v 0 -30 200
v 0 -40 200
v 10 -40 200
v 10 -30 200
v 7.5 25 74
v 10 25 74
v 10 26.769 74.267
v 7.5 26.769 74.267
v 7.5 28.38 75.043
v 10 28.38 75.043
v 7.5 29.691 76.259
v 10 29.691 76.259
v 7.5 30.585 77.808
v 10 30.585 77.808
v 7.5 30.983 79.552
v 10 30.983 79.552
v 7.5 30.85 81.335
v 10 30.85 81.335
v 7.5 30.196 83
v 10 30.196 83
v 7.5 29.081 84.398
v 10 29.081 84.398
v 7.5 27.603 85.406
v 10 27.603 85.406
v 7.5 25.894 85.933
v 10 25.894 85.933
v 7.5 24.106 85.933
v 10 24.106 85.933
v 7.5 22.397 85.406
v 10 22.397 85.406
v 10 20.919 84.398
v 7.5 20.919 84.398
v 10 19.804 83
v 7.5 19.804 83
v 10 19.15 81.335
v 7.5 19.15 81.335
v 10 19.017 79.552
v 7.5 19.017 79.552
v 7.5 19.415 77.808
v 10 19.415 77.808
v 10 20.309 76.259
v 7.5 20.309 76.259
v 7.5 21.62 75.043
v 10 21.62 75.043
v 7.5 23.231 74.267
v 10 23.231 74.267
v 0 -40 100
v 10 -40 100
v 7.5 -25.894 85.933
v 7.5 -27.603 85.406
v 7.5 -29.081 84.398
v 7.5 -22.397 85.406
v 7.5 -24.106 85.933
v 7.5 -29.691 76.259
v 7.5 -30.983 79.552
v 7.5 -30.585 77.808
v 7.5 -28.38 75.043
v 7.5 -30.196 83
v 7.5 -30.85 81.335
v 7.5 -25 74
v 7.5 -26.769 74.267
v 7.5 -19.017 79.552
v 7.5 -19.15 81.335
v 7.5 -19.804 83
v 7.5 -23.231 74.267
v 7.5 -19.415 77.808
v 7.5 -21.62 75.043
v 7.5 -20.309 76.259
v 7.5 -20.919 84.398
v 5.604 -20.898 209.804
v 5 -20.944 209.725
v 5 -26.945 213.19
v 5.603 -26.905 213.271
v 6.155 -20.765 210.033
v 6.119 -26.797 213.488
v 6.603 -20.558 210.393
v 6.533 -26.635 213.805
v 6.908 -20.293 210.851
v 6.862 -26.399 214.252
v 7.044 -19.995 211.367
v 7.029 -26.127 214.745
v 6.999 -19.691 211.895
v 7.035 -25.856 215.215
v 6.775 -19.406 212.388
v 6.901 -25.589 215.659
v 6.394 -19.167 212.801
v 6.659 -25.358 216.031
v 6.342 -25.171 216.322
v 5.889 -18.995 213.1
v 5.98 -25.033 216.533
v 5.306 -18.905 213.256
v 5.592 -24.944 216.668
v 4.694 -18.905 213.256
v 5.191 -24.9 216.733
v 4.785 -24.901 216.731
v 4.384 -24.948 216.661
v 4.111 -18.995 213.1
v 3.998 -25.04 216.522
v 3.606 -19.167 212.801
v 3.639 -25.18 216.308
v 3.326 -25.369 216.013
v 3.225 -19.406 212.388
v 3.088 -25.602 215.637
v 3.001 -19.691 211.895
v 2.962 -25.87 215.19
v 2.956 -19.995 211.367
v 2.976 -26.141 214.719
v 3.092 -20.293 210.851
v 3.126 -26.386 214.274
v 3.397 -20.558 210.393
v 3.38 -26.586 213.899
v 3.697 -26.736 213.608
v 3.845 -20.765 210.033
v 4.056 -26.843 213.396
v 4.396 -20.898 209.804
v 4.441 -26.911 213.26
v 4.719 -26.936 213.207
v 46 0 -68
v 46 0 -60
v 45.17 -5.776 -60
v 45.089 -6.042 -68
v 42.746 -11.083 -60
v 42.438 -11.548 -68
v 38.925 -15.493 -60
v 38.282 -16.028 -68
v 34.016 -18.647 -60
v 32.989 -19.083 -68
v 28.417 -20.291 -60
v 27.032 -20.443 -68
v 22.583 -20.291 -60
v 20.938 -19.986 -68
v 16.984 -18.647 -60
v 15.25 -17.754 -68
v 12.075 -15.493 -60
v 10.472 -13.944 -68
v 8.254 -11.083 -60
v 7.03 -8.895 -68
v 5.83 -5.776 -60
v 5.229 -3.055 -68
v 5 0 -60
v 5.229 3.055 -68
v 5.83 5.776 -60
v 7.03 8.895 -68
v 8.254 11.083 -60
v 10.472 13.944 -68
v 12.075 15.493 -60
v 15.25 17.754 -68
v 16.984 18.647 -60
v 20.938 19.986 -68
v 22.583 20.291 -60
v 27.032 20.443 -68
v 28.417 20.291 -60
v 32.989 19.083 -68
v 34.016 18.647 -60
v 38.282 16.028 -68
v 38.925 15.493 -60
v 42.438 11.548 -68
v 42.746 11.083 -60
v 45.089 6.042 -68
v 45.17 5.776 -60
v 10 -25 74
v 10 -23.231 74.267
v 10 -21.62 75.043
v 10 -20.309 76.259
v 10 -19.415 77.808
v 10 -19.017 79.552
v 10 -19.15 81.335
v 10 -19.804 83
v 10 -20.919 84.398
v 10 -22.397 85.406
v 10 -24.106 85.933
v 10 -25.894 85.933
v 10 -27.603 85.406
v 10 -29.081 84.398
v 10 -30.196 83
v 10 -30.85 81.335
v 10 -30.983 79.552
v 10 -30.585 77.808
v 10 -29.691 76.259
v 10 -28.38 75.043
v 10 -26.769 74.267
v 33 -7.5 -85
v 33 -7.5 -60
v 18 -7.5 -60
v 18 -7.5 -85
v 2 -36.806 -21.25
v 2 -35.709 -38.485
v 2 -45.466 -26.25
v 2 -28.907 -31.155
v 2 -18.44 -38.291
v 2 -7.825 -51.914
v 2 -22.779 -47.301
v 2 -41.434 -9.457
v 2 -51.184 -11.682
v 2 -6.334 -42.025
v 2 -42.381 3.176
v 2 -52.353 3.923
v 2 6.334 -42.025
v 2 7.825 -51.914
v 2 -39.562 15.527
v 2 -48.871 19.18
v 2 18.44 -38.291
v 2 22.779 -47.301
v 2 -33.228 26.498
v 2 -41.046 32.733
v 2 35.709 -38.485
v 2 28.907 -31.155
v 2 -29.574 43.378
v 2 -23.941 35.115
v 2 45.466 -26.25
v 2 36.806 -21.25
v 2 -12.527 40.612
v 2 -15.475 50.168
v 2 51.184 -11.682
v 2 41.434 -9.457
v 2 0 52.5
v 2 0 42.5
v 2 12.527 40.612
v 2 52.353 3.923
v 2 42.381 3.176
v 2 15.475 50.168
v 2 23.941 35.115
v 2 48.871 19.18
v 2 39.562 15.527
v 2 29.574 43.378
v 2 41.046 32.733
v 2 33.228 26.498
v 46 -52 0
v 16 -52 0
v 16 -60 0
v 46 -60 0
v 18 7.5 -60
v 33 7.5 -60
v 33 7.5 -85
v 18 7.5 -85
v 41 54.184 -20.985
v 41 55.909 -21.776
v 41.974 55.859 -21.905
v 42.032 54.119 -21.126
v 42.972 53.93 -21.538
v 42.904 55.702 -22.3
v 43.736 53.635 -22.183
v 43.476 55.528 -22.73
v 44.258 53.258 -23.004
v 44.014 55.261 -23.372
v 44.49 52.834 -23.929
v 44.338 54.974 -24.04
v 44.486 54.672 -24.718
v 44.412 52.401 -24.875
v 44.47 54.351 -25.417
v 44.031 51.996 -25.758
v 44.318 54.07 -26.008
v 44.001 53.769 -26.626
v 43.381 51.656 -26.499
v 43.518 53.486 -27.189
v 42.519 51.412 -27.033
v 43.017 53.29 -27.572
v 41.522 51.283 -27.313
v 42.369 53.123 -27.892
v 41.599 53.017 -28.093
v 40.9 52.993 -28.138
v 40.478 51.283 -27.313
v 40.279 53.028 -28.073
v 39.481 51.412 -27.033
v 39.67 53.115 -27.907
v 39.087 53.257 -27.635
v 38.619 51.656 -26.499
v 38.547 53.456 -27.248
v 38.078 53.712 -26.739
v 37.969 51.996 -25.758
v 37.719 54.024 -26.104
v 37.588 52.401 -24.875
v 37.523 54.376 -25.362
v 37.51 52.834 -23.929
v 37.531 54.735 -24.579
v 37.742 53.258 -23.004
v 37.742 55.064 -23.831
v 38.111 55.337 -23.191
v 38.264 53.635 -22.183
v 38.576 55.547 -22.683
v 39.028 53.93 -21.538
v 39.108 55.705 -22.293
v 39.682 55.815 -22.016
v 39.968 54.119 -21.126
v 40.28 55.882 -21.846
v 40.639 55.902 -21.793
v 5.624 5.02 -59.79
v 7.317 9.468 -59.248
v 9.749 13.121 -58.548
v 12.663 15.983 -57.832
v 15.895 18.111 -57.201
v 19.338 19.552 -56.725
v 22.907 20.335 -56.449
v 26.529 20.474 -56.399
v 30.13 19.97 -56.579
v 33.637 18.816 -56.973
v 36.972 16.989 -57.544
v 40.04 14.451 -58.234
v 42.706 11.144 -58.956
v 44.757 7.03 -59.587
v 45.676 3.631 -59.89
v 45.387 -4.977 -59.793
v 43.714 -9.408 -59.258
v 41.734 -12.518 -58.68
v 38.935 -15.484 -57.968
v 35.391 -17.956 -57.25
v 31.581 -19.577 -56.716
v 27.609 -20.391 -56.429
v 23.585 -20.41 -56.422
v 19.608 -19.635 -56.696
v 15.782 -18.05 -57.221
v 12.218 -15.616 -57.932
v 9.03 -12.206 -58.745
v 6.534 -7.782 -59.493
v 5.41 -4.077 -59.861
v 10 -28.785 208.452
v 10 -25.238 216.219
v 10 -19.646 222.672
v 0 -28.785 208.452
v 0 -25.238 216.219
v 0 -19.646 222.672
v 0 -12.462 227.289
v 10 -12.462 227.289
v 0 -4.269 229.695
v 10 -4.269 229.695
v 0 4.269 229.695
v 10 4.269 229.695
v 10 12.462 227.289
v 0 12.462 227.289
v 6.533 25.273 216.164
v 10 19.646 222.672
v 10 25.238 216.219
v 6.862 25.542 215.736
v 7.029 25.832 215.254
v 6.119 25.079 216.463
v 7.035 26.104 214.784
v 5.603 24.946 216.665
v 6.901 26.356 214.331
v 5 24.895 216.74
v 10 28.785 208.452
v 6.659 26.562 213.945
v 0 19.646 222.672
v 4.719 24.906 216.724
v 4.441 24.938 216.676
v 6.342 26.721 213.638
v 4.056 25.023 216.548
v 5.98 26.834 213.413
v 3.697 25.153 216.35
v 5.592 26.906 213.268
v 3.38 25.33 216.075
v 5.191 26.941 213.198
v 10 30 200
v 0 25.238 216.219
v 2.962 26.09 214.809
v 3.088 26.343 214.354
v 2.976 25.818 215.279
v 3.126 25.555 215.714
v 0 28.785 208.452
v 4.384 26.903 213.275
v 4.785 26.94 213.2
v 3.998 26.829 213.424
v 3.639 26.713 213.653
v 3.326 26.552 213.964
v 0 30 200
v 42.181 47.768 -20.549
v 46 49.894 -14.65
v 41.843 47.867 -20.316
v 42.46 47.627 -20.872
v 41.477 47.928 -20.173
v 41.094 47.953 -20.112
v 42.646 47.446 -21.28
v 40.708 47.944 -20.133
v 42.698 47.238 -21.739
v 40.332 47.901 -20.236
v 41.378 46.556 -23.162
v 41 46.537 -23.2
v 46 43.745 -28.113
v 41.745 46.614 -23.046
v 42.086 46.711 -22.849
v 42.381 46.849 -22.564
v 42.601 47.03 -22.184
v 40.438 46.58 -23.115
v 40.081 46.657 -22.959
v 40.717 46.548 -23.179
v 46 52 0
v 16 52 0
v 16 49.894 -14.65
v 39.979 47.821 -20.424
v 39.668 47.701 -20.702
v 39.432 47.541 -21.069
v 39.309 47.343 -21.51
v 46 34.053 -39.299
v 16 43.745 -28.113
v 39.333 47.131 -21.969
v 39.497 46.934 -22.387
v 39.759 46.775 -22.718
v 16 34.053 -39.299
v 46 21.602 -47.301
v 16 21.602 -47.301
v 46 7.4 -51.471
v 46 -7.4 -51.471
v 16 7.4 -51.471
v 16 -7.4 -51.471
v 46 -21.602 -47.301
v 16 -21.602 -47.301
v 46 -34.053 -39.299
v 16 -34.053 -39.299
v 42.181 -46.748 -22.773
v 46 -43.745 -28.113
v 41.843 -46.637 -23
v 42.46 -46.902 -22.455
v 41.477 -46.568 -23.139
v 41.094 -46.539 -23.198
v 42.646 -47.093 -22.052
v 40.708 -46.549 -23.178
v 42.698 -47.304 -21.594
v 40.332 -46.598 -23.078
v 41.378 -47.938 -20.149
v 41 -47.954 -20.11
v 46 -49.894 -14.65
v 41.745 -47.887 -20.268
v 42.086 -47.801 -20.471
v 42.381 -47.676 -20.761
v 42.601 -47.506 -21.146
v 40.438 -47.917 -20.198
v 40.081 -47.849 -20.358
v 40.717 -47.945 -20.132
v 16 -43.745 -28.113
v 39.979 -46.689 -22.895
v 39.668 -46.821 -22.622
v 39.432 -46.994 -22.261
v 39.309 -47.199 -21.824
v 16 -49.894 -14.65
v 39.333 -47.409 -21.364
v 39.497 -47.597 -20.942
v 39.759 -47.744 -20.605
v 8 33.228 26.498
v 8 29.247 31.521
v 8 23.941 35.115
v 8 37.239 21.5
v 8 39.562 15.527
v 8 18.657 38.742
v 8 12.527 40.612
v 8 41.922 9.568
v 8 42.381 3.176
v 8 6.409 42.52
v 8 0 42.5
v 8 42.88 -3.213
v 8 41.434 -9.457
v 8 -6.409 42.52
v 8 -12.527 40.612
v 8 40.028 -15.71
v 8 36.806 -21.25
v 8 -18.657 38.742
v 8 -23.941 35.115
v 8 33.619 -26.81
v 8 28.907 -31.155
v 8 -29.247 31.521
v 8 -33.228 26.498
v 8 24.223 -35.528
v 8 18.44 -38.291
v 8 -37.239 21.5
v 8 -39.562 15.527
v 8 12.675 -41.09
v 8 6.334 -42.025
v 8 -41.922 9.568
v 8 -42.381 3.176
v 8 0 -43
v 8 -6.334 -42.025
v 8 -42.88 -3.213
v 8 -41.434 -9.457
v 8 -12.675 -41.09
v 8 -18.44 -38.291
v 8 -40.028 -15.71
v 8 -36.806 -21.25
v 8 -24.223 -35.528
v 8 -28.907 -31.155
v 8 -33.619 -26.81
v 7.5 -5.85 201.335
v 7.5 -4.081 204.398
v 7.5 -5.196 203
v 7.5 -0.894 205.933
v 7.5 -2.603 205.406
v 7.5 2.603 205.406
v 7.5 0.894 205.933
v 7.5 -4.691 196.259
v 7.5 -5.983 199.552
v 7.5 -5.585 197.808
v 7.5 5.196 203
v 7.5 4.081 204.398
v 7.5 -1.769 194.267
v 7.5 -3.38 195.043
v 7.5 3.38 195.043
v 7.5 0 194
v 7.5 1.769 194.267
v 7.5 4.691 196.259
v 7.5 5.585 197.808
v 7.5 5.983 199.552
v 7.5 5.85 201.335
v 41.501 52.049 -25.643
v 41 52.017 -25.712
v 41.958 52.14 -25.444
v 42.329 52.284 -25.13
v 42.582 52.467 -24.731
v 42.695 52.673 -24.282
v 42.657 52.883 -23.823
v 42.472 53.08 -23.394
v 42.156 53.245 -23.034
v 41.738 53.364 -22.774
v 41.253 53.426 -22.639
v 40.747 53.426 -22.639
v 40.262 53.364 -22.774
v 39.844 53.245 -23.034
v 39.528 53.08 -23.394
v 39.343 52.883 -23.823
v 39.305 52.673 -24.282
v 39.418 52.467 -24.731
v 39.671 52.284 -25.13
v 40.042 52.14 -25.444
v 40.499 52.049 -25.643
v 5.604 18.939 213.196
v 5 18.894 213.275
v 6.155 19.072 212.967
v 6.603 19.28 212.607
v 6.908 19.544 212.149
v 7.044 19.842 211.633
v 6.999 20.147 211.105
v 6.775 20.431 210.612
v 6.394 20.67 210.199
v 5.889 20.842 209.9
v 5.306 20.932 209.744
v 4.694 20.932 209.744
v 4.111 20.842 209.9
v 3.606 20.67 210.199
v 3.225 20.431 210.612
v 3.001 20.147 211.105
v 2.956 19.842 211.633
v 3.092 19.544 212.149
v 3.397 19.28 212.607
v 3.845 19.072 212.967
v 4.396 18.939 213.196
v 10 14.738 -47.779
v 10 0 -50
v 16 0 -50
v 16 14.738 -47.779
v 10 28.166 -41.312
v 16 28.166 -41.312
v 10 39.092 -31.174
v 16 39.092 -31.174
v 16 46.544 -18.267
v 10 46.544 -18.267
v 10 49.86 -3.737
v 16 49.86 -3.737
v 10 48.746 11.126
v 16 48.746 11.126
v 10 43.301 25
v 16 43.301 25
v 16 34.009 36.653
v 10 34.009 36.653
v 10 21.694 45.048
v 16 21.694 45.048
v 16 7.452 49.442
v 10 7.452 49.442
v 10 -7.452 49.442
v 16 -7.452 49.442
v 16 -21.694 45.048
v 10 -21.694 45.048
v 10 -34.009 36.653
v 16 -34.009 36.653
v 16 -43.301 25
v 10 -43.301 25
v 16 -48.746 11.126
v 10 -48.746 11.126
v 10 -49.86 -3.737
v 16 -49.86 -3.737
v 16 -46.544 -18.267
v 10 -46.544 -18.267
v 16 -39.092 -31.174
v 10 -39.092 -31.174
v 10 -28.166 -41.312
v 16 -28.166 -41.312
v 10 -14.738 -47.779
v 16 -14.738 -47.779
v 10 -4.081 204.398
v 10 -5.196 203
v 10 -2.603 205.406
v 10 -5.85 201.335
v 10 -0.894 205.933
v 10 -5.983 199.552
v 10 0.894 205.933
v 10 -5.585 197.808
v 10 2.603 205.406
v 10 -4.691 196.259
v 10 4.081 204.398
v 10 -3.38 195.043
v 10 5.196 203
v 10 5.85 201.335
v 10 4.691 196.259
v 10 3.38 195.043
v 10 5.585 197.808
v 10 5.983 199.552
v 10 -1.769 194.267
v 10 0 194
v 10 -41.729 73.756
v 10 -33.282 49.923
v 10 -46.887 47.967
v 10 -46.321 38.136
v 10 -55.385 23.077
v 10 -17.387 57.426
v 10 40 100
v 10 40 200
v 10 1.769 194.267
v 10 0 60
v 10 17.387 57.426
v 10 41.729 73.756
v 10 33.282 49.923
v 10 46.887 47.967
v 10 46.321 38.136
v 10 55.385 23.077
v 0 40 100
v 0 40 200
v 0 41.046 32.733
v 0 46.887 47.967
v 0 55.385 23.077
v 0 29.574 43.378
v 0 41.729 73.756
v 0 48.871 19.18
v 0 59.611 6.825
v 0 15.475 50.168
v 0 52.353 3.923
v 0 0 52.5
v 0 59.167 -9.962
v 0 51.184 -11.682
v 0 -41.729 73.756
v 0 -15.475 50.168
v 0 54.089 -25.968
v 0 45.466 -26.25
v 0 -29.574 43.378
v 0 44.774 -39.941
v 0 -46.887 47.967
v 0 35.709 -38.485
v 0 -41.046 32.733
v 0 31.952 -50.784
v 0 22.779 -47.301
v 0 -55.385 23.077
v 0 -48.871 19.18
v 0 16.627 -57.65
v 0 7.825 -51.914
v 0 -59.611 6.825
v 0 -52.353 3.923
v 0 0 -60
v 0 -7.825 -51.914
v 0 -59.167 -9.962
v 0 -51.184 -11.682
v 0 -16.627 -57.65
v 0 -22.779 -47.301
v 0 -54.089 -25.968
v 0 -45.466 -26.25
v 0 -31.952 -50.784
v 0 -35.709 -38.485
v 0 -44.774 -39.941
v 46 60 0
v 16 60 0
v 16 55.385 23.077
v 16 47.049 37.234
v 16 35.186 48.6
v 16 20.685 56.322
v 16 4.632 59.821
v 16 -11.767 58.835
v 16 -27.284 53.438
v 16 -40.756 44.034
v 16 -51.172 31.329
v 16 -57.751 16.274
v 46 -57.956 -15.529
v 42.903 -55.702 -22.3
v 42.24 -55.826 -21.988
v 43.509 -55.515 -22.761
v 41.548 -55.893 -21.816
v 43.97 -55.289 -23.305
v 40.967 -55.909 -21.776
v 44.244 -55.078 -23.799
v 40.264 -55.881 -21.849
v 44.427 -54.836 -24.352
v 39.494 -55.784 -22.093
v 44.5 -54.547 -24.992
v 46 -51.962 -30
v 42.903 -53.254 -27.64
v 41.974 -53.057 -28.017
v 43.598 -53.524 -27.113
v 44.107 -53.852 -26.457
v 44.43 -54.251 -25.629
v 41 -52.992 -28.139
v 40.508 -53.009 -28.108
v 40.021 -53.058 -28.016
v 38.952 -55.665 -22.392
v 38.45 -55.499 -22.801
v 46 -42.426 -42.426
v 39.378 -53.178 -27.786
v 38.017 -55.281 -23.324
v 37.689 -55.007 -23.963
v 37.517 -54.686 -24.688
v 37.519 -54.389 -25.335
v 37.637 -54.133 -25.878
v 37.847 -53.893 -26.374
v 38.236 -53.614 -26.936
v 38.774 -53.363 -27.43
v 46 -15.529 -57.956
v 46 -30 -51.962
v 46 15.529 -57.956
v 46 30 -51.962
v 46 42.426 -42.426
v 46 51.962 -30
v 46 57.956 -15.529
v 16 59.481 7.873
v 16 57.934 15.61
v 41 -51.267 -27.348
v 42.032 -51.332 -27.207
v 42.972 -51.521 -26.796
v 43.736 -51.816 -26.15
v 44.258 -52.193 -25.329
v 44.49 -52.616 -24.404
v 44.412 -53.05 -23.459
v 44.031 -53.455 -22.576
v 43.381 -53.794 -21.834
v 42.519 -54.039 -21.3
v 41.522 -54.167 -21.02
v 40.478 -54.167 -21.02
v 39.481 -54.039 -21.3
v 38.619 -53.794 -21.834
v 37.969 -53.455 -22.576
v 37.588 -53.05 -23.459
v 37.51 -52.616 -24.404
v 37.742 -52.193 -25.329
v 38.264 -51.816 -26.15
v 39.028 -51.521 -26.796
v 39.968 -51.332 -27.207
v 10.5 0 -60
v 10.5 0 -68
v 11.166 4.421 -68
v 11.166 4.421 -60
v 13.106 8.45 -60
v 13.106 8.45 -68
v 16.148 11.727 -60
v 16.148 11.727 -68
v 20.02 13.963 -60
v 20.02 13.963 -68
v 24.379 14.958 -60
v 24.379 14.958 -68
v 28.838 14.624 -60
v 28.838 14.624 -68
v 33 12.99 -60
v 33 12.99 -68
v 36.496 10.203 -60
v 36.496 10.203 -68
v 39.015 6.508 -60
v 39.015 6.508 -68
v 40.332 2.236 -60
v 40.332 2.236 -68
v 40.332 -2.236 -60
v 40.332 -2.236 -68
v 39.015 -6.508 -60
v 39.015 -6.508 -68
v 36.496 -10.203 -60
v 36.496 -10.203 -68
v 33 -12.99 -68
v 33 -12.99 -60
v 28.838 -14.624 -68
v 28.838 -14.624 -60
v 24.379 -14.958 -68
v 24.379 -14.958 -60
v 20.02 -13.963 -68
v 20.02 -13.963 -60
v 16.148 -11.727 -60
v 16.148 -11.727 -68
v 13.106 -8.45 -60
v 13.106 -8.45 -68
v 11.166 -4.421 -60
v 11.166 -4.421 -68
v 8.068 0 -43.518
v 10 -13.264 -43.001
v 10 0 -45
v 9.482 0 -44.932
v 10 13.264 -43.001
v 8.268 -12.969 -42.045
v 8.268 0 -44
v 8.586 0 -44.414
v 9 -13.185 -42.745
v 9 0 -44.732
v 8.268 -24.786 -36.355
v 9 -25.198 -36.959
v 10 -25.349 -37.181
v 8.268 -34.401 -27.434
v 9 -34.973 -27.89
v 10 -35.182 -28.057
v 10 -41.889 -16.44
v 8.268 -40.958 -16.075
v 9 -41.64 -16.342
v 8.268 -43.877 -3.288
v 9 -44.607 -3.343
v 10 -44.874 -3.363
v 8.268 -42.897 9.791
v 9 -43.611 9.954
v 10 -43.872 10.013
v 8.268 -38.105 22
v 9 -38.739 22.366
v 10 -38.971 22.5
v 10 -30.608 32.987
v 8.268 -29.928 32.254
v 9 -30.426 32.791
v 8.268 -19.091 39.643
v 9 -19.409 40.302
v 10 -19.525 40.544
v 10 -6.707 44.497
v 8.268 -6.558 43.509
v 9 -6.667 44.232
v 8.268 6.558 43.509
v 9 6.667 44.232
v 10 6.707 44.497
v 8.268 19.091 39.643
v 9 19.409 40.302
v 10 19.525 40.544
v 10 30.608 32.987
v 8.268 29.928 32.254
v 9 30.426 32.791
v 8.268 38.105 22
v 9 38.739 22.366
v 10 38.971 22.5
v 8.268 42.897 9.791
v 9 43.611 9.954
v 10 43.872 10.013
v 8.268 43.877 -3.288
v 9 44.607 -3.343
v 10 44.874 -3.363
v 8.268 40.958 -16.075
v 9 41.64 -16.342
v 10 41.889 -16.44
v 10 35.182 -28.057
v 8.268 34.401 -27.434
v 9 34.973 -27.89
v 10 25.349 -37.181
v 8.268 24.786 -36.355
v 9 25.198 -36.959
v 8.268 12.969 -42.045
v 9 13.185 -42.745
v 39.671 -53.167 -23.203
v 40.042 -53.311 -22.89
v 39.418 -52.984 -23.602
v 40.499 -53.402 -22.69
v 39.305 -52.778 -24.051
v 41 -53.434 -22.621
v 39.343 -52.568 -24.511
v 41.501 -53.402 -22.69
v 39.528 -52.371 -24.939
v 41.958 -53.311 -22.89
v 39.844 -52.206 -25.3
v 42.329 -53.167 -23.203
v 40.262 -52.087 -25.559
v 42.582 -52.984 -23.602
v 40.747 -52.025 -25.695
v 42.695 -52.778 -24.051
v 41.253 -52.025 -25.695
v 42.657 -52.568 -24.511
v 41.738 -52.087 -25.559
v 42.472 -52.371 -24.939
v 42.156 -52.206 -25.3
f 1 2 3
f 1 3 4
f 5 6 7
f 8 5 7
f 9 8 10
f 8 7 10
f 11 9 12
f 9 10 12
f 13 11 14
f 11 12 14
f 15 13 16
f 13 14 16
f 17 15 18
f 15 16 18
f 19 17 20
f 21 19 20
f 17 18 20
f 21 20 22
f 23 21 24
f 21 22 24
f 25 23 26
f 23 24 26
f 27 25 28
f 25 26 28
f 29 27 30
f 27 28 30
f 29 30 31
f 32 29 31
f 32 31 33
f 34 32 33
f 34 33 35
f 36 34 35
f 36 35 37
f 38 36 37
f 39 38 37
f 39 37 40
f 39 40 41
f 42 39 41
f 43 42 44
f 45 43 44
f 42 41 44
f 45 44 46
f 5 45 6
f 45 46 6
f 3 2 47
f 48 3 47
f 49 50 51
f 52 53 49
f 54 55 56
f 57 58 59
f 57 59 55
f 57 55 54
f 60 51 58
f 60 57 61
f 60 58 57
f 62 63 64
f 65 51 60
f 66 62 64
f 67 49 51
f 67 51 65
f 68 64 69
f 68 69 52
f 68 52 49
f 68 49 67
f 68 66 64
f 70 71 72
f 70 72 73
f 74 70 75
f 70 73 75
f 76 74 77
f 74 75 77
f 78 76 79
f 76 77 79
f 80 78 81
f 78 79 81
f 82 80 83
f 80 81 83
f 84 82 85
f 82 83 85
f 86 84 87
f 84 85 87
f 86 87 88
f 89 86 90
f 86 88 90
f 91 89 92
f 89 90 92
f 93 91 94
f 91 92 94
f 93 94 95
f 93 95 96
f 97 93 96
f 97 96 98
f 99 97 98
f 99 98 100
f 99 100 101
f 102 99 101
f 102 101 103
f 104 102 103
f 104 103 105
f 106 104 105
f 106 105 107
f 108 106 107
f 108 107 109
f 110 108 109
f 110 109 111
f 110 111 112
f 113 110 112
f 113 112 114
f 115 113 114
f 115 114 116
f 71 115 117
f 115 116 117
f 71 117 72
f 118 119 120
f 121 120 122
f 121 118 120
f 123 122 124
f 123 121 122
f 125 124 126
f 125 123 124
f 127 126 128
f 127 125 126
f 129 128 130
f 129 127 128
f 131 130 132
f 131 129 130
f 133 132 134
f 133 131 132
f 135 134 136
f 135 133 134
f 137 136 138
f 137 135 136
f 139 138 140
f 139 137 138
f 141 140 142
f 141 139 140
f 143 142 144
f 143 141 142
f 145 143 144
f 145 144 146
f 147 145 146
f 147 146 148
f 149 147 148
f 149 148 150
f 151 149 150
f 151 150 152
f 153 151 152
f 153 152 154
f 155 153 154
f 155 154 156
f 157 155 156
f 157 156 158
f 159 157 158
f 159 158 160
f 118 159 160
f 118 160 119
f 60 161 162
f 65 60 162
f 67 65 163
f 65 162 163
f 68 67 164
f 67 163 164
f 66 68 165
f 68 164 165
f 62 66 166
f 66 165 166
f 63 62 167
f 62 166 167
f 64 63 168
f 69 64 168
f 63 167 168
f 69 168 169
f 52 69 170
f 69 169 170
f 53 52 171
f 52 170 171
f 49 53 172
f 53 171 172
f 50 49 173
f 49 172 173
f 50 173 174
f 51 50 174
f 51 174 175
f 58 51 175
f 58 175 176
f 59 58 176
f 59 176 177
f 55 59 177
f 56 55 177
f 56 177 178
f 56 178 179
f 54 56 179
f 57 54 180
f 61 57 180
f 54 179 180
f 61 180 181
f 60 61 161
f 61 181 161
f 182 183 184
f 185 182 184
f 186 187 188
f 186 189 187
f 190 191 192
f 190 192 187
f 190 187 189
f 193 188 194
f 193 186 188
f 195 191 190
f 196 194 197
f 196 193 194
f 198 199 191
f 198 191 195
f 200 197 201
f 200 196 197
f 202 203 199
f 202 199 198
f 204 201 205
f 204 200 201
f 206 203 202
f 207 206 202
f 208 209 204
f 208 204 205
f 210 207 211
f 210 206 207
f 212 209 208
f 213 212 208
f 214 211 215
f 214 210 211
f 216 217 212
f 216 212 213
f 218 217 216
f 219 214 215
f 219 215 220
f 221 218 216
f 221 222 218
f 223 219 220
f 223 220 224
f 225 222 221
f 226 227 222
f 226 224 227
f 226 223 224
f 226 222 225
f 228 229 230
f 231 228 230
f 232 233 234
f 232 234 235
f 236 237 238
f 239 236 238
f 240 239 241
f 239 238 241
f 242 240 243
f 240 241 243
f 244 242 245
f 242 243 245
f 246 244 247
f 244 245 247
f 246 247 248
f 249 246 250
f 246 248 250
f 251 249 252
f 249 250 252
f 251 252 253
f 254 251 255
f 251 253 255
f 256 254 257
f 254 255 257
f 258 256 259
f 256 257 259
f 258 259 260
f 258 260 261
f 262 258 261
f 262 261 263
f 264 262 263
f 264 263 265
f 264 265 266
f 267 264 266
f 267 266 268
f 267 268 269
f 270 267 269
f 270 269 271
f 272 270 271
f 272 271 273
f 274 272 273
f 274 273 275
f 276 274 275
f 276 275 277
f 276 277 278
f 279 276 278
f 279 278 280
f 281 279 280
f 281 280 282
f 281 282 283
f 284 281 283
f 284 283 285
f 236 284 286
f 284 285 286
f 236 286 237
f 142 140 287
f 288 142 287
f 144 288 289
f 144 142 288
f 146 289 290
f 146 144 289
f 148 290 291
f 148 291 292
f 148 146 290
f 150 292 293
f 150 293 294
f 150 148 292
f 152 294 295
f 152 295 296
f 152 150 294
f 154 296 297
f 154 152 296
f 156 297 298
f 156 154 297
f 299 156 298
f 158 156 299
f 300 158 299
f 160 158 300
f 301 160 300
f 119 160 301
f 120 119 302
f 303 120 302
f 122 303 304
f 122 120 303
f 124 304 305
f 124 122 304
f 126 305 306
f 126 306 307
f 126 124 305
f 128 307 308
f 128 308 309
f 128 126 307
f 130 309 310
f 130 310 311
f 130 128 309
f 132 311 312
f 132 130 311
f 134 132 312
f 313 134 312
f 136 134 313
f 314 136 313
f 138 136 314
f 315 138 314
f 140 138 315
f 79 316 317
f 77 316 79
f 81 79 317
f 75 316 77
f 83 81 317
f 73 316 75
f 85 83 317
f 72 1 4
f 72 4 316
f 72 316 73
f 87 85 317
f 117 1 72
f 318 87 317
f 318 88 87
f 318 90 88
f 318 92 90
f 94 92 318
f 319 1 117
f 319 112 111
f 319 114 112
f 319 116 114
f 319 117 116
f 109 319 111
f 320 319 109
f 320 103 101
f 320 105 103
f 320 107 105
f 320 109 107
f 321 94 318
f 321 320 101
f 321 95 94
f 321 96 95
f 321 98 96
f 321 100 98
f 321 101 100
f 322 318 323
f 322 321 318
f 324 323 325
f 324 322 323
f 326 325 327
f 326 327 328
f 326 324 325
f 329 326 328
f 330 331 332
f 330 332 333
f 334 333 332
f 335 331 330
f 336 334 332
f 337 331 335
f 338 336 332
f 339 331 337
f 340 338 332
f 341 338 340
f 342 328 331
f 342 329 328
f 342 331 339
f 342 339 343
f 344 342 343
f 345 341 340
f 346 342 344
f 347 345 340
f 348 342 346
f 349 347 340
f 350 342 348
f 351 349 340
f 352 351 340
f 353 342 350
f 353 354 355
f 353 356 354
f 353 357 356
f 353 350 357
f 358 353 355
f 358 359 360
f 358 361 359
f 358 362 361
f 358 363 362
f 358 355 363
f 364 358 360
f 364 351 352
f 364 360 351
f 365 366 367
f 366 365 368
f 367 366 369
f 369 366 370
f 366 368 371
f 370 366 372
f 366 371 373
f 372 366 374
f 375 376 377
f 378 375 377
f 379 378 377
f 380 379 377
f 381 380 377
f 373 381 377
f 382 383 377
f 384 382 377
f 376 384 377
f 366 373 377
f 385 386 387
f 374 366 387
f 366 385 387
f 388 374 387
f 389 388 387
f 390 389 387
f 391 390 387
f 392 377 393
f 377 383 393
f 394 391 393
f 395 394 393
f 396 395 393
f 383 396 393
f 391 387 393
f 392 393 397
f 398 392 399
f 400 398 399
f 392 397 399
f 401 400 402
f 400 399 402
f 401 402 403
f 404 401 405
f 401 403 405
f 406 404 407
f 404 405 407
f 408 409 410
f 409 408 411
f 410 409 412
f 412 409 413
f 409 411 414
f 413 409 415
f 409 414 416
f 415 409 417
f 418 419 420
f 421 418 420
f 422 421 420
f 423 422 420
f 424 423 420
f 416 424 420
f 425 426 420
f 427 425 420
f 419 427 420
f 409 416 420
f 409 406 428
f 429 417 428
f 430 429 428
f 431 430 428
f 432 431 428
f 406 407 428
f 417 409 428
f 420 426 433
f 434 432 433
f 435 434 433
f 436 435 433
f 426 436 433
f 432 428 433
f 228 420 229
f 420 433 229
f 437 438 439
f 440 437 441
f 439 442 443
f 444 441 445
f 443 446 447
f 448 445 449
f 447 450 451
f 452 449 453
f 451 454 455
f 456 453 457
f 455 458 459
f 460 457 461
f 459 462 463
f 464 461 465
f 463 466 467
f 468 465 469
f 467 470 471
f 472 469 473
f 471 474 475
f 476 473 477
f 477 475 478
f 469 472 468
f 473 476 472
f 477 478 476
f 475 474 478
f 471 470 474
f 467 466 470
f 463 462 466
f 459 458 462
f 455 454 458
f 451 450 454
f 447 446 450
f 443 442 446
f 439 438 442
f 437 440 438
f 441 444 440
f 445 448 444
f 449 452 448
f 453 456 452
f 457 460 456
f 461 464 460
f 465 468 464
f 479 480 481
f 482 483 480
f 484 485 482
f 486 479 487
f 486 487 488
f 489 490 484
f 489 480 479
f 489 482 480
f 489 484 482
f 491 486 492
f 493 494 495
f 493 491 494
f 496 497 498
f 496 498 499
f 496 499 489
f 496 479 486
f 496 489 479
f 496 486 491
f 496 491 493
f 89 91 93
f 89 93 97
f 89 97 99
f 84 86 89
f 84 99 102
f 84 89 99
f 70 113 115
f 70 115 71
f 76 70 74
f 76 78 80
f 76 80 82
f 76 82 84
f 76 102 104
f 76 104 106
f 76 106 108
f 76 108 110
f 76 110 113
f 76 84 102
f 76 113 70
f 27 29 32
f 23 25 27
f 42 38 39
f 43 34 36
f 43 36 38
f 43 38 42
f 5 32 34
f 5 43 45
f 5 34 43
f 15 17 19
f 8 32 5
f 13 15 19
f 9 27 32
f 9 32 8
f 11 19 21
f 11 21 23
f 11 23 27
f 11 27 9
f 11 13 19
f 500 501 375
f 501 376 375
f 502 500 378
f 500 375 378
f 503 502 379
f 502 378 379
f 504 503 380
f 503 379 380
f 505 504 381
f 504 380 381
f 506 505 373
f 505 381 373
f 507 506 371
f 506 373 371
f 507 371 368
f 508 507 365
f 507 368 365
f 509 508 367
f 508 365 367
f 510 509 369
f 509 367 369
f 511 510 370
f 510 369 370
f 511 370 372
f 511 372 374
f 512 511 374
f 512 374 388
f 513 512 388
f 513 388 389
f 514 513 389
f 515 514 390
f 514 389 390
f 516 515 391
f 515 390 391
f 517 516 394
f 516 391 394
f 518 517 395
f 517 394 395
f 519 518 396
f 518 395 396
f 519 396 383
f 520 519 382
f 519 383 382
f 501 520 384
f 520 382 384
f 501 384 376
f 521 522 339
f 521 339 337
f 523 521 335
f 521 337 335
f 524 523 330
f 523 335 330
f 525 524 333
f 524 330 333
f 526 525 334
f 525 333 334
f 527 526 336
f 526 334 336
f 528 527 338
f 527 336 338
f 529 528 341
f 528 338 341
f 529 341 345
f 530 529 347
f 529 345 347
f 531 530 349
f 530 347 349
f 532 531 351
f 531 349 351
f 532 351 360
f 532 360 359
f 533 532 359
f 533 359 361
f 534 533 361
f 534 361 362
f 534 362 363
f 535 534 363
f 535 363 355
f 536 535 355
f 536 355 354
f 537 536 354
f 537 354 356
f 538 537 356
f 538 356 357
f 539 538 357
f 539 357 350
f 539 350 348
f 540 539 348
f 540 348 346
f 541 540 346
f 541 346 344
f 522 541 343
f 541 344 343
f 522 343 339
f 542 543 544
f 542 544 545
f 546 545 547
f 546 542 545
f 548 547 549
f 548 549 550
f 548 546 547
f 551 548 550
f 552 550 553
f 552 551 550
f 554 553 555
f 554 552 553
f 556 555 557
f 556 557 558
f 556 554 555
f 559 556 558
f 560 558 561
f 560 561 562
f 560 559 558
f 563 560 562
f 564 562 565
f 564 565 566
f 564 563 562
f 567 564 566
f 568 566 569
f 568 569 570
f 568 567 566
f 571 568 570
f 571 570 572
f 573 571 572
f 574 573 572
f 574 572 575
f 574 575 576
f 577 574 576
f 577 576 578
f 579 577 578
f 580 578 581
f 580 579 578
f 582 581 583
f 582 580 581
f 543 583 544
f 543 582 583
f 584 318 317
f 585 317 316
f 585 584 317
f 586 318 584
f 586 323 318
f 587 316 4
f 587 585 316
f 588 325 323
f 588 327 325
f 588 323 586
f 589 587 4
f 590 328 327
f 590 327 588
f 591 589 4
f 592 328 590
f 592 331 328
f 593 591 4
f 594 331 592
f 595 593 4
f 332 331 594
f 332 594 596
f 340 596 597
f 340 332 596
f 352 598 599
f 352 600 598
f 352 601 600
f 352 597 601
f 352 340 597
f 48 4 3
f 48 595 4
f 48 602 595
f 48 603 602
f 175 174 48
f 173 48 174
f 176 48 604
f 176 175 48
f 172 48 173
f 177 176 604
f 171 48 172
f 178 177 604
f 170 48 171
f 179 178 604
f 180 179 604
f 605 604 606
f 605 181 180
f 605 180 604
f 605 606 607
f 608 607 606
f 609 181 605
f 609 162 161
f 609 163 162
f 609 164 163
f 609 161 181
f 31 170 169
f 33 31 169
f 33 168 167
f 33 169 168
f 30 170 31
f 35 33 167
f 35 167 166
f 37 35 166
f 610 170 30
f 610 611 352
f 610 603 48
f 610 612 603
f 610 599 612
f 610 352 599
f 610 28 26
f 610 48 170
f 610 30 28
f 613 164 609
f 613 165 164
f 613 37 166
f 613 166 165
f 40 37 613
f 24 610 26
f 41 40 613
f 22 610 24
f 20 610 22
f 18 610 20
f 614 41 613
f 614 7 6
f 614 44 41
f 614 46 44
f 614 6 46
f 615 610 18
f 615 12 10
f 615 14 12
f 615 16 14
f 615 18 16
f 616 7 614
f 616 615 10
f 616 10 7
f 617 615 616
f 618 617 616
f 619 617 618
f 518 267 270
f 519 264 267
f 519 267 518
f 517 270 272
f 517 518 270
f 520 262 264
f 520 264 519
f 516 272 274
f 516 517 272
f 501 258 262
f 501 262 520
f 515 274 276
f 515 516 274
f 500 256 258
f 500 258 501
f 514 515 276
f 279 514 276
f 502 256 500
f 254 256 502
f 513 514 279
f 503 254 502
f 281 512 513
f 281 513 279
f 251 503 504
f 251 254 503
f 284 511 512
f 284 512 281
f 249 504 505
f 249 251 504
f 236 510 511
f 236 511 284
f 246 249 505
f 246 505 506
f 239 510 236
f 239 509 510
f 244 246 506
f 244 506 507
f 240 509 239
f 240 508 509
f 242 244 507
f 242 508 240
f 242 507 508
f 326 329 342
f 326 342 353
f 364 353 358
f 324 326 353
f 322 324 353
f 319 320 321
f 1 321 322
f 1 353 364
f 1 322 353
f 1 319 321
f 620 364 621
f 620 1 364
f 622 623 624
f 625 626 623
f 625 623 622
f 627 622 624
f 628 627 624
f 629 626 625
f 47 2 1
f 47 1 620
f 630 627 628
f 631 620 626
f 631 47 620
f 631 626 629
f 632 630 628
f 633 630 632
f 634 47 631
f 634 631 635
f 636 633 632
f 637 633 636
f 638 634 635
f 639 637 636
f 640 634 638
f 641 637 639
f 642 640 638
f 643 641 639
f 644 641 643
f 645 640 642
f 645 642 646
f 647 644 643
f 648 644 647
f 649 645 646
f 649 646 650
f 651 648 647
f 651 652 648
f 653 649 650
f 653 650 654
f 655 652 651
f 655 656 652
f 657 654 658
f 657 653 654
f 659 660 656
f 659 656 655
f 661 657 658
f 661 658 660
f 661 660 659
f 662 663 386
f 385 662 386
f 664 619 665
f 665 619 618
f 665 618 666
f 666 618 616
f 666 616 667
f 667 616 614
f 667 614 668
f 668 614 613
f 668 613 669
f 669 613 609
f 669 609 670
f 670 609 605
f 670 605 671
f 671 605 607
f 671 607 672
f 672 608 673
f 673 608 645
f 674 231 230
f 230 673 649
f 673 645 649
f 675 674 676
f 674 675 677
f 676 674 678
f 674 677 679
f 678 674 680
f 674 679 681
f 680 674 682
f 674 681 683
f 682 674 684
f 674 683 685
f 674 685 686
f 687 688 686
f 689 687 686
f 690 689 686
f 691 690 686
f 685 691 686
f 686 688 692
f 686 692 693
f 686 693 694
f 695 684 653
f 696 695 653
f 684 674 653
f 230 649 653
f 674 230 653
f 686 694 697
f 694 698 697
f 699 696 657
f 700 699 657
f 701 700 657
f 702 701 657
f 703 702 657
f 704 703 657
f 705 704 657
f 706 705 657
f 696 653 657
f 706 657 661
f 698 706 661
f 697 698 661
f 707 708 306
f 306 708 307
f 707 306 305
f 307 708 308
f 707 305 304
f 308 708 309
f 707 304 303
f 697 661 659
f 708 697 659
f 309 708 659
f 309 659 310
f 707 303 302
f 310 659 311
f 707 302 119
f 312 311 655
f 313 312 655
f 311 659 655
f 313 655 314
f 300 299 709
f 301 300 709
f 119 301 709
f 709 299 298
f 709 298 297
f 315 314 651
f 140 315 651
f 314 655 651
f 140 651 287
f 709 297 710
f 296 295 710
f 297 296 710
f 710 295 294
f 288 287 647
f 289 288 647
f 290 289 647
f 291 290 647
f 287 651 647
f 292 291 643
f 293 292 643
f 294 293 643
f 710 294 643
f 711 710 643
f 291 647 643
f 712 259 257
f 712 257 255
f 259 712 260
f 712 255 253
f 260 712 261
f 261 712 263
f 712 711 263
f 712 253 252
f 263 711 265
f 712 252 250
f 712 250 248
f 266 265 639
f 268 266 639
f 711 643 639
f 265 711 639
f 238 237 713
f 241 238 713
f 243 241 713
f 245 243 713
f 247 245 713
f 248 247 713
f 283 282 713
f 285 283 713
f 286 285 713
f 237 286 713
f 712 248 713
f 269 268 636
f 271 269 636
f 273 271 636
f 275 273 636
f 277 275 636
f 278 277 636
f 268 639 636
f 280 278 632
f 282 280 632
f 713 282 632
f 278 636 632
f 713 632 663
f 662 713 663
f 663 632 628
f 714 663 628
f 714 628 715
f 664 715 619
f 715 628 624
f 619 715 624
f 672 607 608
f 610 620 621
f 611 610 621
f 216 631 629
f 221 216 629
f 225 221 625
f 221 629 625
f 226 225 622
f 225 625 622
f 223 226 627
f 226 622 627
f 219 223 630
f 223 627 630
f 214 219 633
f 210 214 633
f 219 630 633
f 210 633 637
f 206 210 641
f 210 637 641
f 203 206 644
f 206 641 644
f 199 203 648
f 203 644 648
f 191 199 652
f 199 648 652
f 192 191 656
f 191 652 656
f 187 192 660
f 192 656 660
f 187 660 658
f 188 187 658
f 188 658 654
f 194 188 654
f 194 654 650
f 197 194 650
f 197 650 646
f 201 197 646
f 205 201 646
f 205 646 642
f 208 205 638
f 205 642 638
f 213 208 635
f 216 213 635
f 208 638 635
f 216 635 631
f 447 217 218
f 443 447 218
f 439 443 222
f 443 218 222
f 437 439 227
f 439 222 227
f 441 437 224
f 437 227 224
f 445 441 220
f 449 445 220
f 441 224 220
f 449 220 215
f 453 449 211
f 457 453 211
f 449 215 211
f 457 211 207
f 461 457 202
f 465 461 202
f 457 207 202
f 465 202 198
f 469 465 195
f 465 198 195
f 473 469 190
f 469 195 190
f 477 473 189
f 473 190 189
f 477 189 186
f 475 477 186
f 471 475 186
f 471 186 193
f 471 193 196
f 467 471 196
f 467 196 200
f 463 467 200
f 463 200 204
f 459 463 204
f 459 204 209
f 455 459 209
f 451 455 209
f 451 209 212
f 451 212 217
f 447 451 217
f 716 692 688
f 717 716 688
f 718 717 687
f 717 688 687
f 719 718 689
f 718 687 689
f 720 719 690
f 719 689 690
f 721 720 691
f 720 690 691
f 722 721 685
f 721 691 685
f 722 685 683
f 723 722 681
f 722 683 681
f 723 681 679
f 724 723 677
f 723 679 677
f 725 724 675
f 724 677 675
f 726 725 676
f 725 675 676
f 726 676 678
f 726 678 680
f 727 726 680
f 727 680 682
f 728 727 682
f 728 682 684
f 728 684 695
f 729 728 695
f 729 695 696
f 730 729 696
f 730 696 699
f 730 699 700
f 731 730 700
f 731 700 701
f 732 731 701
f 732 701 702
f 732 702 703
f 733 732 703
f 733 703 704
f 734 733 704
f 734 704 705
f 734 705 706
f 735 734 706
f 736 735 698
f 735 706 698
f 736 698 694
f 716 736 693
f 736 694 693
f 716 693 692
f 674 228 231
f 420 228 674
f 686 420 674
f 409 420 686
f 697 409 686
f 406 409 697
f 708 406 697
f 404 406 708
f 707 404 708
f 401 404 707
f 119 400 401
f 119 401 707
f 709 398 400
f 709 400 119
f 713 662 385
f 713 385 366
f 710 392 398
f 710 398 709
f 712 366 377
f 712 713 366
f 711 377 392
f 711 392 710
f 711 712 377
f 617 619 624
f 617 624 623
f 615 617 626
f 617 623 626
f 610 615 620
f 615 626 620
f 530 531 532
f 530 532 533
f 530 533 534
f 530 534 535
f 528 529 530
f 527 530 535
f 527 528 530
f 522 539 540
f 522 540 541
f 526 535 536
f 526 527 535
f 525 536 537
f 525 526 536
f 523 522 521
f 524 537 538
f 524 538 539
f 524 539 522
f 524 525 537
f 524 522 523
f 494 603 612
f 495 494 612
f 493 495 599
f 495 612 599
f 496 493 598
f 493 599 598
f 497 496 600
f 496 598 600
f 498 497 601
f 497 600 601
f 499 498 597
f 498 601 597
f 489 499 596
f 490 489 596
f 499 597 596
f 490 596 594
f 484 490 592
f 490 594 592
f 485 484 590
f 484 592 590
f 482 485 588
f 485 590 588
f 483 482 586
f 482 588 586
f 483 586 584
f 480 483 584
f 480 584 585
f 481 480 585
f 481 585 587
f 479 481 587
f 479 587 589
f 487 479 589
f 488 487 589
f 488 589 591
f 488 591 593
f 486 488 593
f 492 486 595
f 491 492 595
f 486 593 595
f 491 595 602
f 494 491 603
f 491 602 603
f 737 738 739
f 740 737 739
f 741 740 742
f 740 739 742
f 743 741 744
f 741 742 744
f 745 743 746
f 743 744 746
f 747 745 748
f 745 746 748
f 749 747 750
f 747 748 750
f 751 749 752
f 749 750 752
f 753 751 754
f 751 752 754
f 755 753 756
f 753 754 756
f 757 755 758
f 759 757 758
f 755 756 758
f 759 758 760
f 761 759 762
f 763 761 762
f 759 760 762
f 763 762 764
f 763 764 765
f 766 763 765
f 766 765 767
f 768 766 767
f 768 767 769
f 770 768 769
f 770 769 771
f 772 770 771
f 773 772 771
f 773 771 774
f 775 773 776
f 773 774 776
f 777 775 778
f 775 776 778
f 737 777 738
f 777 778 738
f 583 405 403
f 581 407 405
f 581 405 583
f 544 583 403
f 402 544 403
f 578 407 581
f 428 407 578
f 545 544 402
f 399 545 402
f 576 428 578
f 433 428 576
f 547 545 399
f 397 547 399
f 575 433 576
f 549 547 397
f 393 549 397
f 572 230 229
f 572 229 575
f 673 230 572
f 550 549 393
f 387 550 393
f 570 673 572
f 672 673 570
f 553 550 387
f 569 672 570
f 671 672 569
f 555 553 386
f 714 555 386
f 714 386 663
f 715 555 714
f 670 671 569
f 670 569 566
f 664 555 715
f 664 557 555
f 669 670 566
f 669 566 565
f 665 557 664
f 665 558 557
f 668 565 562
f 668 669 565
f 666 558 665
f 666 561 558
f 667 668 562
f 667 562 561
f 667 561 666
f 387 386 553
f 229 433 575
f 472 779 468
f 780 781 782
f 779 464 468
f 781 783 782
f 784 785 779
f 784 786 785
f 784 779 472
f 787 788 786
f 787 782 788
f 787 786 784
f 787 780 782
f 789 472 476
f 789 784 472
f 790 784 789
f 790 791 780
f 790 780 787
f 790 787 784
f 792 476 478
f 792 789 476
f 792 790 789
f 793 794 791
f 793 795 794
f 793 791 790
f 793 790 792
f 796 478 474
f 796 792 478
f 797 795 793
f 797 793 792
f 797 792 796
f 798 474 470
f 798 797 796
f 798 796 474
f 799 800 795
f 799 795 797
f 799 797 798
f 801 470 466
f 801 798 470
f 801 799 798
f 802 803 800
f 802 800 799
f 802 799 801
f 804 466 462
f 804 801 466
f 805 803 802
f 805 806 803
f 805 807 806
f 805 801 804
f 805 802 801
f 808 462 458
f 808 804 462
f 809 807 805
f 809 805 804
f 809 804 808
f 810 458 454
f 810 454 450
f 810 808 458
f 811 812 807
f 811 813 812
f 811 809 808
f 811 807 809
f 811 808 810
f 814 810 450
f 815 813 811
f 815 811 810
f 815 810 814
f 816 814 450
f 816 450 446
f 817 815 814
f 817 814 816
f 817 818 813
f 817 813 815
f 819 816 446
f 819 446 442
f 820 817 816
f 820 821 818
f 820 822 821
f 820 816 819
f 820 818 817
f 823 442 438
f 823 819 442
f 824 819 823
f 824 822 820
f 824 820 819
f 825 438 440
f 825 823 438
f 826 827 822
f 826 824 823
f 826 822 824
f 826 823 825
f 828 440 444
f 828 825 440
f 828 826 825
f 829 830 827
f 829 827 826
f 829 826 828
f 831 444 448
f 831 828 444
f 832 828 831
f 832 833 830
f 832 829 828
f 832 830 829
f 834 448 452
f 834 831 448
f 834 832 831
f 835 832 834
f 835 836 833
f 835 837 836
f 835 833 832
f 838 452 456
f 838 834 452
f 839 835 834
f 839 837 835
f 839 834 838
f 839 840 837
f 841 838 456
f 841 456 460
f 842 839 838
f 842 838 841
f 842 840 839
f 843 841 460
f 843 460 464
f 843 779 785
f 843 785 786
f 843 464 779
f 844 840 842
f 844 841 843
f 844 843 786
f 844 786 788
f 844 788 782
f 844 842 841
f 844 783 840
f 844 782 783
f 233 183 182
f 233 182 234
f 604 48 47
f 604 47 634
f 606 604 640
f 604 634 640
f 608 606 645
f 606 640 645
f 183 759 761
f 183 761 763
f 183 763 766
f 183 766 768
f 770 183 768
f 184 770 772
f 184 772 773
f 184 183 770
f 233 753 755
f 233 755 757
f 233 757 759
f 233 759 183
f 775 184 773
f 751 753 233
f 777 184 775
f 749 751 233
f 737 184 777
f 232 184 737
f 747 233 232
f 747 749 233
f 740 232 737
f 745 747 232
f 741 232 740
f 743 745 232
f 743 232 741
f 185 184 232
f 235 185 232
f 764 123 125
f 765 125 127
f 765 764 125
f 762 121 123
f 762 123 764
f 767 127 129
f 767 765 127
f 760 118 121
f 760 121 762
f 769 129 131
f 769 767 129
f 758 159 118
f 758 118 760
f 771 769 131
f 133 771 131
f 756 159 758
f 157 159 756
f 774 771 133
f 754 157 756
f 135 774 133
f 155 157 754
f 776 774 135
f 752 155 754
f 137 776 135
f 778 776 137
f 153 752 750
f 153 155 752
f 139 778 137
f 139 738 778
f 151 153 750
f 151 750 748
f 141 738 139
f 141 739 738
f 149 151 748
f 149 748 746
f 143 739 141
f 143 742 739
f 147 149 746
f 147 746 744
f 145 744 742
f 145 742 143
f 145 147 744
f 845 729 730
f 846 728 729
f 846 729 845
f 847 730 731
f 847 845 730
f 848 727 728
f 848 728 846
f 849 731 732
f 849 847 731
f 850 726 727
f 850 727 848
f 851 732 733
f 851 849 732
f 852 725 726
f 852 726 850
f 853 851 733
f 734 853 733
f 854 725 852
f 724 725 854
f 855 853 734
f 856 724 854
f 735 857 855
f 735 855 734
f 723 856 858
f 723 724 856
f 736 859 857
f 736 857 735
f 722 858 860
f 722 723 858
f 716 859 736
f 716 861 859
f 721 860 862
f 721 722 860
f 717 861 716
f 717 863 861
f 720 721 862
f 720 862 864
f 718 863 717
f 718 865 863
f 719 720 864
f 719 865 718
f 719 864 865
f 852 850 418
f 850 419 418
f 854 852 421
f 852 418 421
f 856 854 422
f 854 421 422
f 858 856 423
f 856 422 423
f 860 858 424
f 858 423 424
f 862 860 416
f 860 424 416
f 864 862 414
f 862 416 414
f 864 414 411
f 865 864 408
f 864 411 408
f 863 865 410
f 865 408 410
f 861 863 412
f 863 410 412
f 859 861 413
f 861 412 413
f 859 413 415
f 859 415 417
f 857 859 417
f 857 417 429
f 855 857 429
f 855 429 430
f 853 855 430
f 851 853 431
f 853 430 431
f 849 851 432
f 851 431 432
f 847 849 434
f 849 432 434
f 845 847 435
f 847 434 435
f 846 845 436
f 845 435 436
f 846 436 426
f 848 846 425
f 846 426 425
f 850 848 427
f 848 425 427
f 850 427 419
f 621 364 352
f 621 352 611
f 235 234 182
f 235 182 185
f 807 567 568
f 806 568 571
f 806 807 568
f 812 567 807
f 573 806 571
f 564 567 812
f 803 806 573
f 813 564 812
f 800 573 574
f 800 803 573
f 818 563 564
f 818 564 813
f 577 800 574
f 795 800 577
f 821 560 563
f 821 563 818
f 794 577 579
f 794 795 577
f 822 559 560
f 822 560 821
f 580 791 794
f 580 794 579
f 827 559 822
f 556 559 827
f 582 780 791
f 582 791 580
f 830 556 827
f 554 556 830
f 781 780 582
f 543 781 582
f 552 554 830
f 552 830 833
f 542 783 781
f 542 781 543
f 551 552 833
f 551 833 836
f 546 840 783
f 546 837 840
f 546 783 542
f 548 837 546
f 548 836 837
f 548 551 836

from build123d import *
from build123d.topology import SkipClean

# Parameters (mm, degrees)
SKETCH1_R                                            = 60
SKETCH1_R_2                                          = 45
SKETCH1_R_3                                          = 40.00000000000001
BOSS_EXTRUDE3_DEPTH                                  = 10
SKETCH4_R                                            = 60.00000000000001
SKETCH4_R_2                                          = 50
BOSS_EXTRUDE4_DEPTH                                  = 6
SKETCH5_R                                            = 45.00000000000001
SKETCH5_R_2                                          = 42.5
BOSS_EXTRUDE5_DEPTH                                  = 8
FILLET1_R                                            = 2
SKETCH6_R                                            = 52.5
SKETCH6_R_2                                          = 42.500000000000014
CUT_EXTRUDE2_DEPTH                                   = 2
BOSS_EXTRUDE6_DEPTH                                  = 30
BOSS_EXTRUDE7_REACH                                  = 311.38
SKETCH8_R                                            = 20.5
CUT_EXTRUDE4_DEPTH                                   = 250.99199991039714
CUT_EXTRUDE4_DEPTH_BACK                              = 250.99199991039714
BOSS_EXTRUDE8_START                                  = 8
SKETCH9_R                                            = 15
BOSS_EXTRUDE8_DEPTH                                  = 8
SKETCH12_W                                           = 14.999999999999996
SKETCH12_H                                           = 15
BOSS_EXTRUDE9_DEPTH                                  = 25
CBORE_FOR_M3_HEXAGON_HEAD_BOLTS_FULL_THR_D           = 3.4
CBORE_FOR_M3_HEXAGON_HEAD_BOLTS_FULL_THR_CBORE_D     = 7
CBORE_FOR_M3_HEXAGON_HEAD_BOLTS_FULL_THR_CBORE_DEPTH = 2
CBORE_FOR_M3_HEXAGON_HEAD_BOLTS_FULL_2_D             = 3.4
CBORE_FOR_M3_HEXAGON_HEAD_BOLTS_FULL_2_CBORE_D       = 7
CBORE_FOR_M3_HEXAGON_HEAD_BOLTS_FULL_2_CBORE_DEPTH   = 2
SKETCH14_R                                           = 2.049999999999999
CUT_EXTRUDE5_DEPTH                                   = 15
SKETCH15_R                                           = 2.0499999999999985
CUT_EXTRUDE6_DEPTH                                   = 15
SKETCH16_R                                           = 6.000000000000016
CUT_EXTRUDE7_DEPTH                                   = 2.5
SKETCH17_R                                           = 6.000000000000003
CUT_EXTRUDE8_DEPTH                                   = 2.5


with BuildPart() as part:
    # Sketch1 → Boss-Extrude3 (new body)
    # profile 1 of 3: a face of its own
    with BuildSketch(Plane(origin=(0, 0, 0), x_dir=(0, 0, -1), z_dir=(1, 0, 0))):
        Circle(SKETCH1_R)
        Circle(SKETCH1_R_2, mode=Mode.SUBTRACT)
    # profile 2 of 3: a face of its own
    with BuildSketch(Plane(origin=(0, 0, 0), x_dir=(0, 0, -1), z_dir=(1, 0, 0))):
        with BuildLine():
            ThreePointArc((-23.076923076923066, 55.38461538461536), (-60.77677297236316, 43.883864861815795), (-100, 39.99999999999997))
            Line((-100, 39.999999999999986), (-200, 39.99999999999997))
            ThreePointArc((-200, 39.999999999999986), (-171.7157287525381, 28.284271247461877), (-160, -2.449e-14))
            ThreePointArc((-160, -3.429e-14), (-171.7157287525381, -28.284271247461938), (-200, -40.00000000000003))
            Line((-200, -40.00000000000003), (-100, -40.000000000000014))
            ThreePointArc((-100, -40.00000000000003), (-60.776772972363155, -43.88386486181582), (-23.07692307692308, -55.38461538461539))
            ThreePointArc((-23.0769230769231, -55.38461538461537), (-60, 7.35e-15), (-23.076923076923073, 55.38461538461539))
        make_face()
    # profile 3 of 3: a face of its own
    with BuildSketch(Plane(origin=(0, 0, 0), x_dir=(0, 0, -1), z_dir=(1, 0, 0))):
        with Locations((-200, -2.449e-14)):
            Circle(SKETCH1_R_3)
    extrude(amount=BOSS_EXTRUDE3_DEPTH)

    # Sketch4 → Boss-Extrude4 (add)
    with BuildSketch(Plane(origin=(10, 0, 0), x_dir=(0, 0, -1), z_dir=(1, 0, 0))):
        with Locations(Location((0, 0, 0), (0, 0, 112.619864948))):
            Circle(SKETCH4_R)
        Circle(SKETCH4_R_2, mode=Mode.SUBTRACT)
    extrude(amount=BOSS_EXTRUDE4_DEPTH)

    # Sketch5 → Boss-Extrude5 (add)
    with BuildSketch(Plane.ZY):
        with Locations(Location((0, 0, 0), (0, 0, 180))):
            Circle(SKETCH5_R)
        Circle(SKETCH5_R_2, mode=Mode.SUBTRACT)
    extrude(amount=-BOSS_EXTRUDE5_DEPTH)

    # Fillet1
    fillet1_edges = [part.edges().sort_by_distance(p)[0] for p in [
        (8, -1.102e-14, 45.00000000000001),
    ]]
    fillet(fillet1_edges, radius=FILLET1_R - 0.0001)  # a hair under: the kernel refuses the full size

    # Sketch6 → Cut-Extrude2 (cut)
    with BuildSketch(Plane.ZY):
        Circle(SKETCH6_R)
        Circle(SKETCH6_R_2, mode=Mode.SUBTRACT)
    extrude(amount=-CUT_EXTRUDE2_DEPTH, mode=Mode.SUBTRACT)

    # Sketch7 → Boss-Extrude6 (add)
    with BuildSketch(Plane(origin=(16, 0, 0), x_dir=(0, 0, -1), z_dir=(1, 0, 0))):
        with BuildLine():
            ThreePointArc((60.00000000000001, -1.2e-16), (42.42640687119286, 42.42640687119285), (7.35e-15, 60.000000000000014))
            Line((0, 60.00000000000001), (0, 52.000000000000014))
            ThreePointArc((5.5e-14, 52.000000000000014), (52, -2.872e-14), (-9.55e-15, -52))
            Line((0, -52), (0, -60.00000000000001))
            ThreePointArc((0, -60), (42.42640687119285, -42.42640687119285), (60.00000000000001, -1.2e-16))
        make_face()
    extrude(amount=BOSS_EXTRUDE6_DEPTH)

    # Sketch8 → Boss-Extrude7 (add, up to next)
    with BuildSketch(Plane(origin=(0, 0, -60), x_dir=(-1, 0, 0), z_dir=(0, 0, -1)), mode=Mode.PRIVATE) as boss_extrude7_sk1:
        with Locations((-25.500000000000004, -2.72e-15)):
            Circle(SKETCH8_R)
    boss_extrude7_tool1 = extrude(boss_extrude7_sk1.sketch, amount=-BOSS_EXTRUDE7_REACH, mode=Mode.PRIVATE) - part.part
    add(boss_extrude7_tool1.solids().sort_by_distance((25.5, 0, -60))[0])
    add(boss_extrude7_tool1.solids().sort_by_distance((25.5, 0, -60))[1])

    # Sketch11 → Cut-Extrude4 (cut, two sides: drawn at the far end of the back side and taken through both)
    with BuildSketch(Plane(origin=(10, 0, 0), x_dir=(0, 0, -1), z_dir=(1, 0, 0)).offset(-CUT_EXTRUDE4_DEPTH_BACK)):
        with BuildLine():
            Line((-200, 29.999999999999975), (-200, 39.99999999999997))
            ThreePointArc((-200, 39.99999999999997), (-240, -1.959e-14), (-200, -40.00000000000003))
            Line((-200, -40.00000000000003), (-200, -30.000000000000025))
            ThreePointArc((-200, -30.000000000000025), (-230, -2.082e-14), (-200, 29.999999999999975))
        make_face()
    extrude(amount=CUT_EXTRUDE4_DEPTH + CUT_EXTRUDE4_DEPTH_BACK, mode=Mode.SUBTRACT)

    # Sketch9 → Boss-Extrude8 (add)
    with SkipClean():  # the faces are left unmerged after this step: merging them gives an invalid solid
        with BuildSketch(Plane(origin=(0, 0, -60), x_dir=(-1, 0, 0), z_dir=(0, 0, -1)).offset(BOSS_EXTRUDE8_START)):
            with BuildLine():
                ThreePointArc((-5.000000000000001, 0), (-25.500000000000007, 20.5), (-46, 0))
                ThreePointArc((-46, 0), (-25.500000000000007, -20.5), (-5.000000000000001, 0))
            make_face()
            with Locations((-25.500000000000004, -2.72e-15)):
                Circle(SKETCH9_R, mode=Mode.SUBTRACT)
        extrude(amount=-BOSS_EXTRUDE8_DEPTH)

    # Sketch12 → Boss-Extrude9 (add)
    with SkipClean():  # the faces are left unmerged after this step: merging them gives an invalid solid
        with BuildSketch(Plane(origin=(0, 0, -60), x_dir=(-1, 0, 0), z_dir=(0, 0, -1))):
            with Locations((-25.5, -3.11e-15)):
                Rectangle(SKETCH12_W, SKETCH12_H)
        extrude(amount=BOSS_EXTRUDE9_DEPTH)

    # CBORE for M3 Hexagon head bolts-Full thread-grades AB1 (through all)
    with Locations(Plane(origin=(41, -54.543560573, -25), x_dir=(0, 0.416666666667, -0.909059342886), z_dir=(0, -0.909059342886, -0.416666666667))):
        with Locations((0, 0)):
            CounterBoreHole(CBORE_FOR_M3_HEXAGON_HEAD_BOLTS_FULL_THR_D / 2, CBORE_FOR_M3_HEXAGON_HEAD_BOLTS_FULL_THR_CBORE_D / 2, CBORE_FOR_M3_HEXAGON_HEAD_BOLTS_FULL_THR_CBORE_DEPTH)

    # CBORE for M3 Hexagon head bolts-Full 2 (through all)
    with Locations(Plane(origin=(41, 54.543560573, -25), x_dir=(0, 0.416667072006, 0.909059157099), z_dir=(0, 0.909059157099, -0.416667072006))):
        with Locations((0, 0)):
            CounterBoreHole(CBORE_FOR_M3_HEXAGON_HEAD_BOLTS_FULL_2_D / 2, CBORE_FOR_M3_HEXAGON_HEAD_BOLTS_FULL_2_CBORE_D / 2, CBORE_FOR_M3_HEXAGON_HEAD_BOLTS_FULL_2_CBORE_DEPTH)

    # Sketch14 → Cut-Extrude5 (cut)
    with SkipClean():  # the faces are left unmerged after this step: merging them gives an invalid solid
        with BuildSketch(Plane(origin=(0, 119.51150572225207, 68.9999999999988), x_dir=(1, 0, 0), z_dir=(0, 0.8660254037844414, 0.49999999999999517))):
            with Locations(Location((4.999999999999994, -173.20508075688855, 0), (0, 0, 270))):
                Circle(SKETCH14_R)
        extrude(amount=-CUT_EXTRUDE5_DEPTH, mode=Mode.SUBTRACT)

    # Sketch15 → Cut-Extrude6 (cut)
    with SkipClean():  # the faces are left unmerged after this step: merging them gives an invalid solid
        with BuildSketch(Plane(origin=(0, -119.5115057222521, 68.99999999999882), x_dir=(-1, 0, 0), z_dir=(0, -0.8660254037844414, 0.49999999999999517))):
            with Locations(Location((-4.999999999999994, -173.20508075688852, 0), (0, 0, 90))):
                Circle(SKETCH15_R)
        extrude(amount=-CUT_EXTRUDE6_DEPTH, mode=Mode.SUBTRACT)

    # Sketch16 → Cut-Extrude7 (cut)
    with SkipClean():  # the faces are left unmerged after this step: merging them gives an invalid solid
        with BuildSketch(Plane(origin=(10, 0, 0), x_dir=(0, 0, -1), z_dir=(1, 0, 0))):
            with Locations((-200, 0)):
                Circle(SKETCH16_R)
        extrude(amount=-CUT_EXTRUDE7_DEPTH, mode=Mode.SUBTRACT)

    # Sketch17 → Cut-Extrude8 (cut)
    with SkipClean():  # the faces are left unmerged after this step: merging them gives an invalid solid
        with BuildSketch(Plane(origin=(10, 0, 0), x_dir=(0, 0, -1), z_dir=(1, 0, 0))):
            with Locations((-80, -25)):
                Circle(SKETCH17_R)
            with Locations((-80, 25)):
                Circle(SKETCH17_R)
        extrude(amount=-CUT_EXTRUDE8_DEPTH, mode=Mode.SUBTRACT)


solid = part.part
